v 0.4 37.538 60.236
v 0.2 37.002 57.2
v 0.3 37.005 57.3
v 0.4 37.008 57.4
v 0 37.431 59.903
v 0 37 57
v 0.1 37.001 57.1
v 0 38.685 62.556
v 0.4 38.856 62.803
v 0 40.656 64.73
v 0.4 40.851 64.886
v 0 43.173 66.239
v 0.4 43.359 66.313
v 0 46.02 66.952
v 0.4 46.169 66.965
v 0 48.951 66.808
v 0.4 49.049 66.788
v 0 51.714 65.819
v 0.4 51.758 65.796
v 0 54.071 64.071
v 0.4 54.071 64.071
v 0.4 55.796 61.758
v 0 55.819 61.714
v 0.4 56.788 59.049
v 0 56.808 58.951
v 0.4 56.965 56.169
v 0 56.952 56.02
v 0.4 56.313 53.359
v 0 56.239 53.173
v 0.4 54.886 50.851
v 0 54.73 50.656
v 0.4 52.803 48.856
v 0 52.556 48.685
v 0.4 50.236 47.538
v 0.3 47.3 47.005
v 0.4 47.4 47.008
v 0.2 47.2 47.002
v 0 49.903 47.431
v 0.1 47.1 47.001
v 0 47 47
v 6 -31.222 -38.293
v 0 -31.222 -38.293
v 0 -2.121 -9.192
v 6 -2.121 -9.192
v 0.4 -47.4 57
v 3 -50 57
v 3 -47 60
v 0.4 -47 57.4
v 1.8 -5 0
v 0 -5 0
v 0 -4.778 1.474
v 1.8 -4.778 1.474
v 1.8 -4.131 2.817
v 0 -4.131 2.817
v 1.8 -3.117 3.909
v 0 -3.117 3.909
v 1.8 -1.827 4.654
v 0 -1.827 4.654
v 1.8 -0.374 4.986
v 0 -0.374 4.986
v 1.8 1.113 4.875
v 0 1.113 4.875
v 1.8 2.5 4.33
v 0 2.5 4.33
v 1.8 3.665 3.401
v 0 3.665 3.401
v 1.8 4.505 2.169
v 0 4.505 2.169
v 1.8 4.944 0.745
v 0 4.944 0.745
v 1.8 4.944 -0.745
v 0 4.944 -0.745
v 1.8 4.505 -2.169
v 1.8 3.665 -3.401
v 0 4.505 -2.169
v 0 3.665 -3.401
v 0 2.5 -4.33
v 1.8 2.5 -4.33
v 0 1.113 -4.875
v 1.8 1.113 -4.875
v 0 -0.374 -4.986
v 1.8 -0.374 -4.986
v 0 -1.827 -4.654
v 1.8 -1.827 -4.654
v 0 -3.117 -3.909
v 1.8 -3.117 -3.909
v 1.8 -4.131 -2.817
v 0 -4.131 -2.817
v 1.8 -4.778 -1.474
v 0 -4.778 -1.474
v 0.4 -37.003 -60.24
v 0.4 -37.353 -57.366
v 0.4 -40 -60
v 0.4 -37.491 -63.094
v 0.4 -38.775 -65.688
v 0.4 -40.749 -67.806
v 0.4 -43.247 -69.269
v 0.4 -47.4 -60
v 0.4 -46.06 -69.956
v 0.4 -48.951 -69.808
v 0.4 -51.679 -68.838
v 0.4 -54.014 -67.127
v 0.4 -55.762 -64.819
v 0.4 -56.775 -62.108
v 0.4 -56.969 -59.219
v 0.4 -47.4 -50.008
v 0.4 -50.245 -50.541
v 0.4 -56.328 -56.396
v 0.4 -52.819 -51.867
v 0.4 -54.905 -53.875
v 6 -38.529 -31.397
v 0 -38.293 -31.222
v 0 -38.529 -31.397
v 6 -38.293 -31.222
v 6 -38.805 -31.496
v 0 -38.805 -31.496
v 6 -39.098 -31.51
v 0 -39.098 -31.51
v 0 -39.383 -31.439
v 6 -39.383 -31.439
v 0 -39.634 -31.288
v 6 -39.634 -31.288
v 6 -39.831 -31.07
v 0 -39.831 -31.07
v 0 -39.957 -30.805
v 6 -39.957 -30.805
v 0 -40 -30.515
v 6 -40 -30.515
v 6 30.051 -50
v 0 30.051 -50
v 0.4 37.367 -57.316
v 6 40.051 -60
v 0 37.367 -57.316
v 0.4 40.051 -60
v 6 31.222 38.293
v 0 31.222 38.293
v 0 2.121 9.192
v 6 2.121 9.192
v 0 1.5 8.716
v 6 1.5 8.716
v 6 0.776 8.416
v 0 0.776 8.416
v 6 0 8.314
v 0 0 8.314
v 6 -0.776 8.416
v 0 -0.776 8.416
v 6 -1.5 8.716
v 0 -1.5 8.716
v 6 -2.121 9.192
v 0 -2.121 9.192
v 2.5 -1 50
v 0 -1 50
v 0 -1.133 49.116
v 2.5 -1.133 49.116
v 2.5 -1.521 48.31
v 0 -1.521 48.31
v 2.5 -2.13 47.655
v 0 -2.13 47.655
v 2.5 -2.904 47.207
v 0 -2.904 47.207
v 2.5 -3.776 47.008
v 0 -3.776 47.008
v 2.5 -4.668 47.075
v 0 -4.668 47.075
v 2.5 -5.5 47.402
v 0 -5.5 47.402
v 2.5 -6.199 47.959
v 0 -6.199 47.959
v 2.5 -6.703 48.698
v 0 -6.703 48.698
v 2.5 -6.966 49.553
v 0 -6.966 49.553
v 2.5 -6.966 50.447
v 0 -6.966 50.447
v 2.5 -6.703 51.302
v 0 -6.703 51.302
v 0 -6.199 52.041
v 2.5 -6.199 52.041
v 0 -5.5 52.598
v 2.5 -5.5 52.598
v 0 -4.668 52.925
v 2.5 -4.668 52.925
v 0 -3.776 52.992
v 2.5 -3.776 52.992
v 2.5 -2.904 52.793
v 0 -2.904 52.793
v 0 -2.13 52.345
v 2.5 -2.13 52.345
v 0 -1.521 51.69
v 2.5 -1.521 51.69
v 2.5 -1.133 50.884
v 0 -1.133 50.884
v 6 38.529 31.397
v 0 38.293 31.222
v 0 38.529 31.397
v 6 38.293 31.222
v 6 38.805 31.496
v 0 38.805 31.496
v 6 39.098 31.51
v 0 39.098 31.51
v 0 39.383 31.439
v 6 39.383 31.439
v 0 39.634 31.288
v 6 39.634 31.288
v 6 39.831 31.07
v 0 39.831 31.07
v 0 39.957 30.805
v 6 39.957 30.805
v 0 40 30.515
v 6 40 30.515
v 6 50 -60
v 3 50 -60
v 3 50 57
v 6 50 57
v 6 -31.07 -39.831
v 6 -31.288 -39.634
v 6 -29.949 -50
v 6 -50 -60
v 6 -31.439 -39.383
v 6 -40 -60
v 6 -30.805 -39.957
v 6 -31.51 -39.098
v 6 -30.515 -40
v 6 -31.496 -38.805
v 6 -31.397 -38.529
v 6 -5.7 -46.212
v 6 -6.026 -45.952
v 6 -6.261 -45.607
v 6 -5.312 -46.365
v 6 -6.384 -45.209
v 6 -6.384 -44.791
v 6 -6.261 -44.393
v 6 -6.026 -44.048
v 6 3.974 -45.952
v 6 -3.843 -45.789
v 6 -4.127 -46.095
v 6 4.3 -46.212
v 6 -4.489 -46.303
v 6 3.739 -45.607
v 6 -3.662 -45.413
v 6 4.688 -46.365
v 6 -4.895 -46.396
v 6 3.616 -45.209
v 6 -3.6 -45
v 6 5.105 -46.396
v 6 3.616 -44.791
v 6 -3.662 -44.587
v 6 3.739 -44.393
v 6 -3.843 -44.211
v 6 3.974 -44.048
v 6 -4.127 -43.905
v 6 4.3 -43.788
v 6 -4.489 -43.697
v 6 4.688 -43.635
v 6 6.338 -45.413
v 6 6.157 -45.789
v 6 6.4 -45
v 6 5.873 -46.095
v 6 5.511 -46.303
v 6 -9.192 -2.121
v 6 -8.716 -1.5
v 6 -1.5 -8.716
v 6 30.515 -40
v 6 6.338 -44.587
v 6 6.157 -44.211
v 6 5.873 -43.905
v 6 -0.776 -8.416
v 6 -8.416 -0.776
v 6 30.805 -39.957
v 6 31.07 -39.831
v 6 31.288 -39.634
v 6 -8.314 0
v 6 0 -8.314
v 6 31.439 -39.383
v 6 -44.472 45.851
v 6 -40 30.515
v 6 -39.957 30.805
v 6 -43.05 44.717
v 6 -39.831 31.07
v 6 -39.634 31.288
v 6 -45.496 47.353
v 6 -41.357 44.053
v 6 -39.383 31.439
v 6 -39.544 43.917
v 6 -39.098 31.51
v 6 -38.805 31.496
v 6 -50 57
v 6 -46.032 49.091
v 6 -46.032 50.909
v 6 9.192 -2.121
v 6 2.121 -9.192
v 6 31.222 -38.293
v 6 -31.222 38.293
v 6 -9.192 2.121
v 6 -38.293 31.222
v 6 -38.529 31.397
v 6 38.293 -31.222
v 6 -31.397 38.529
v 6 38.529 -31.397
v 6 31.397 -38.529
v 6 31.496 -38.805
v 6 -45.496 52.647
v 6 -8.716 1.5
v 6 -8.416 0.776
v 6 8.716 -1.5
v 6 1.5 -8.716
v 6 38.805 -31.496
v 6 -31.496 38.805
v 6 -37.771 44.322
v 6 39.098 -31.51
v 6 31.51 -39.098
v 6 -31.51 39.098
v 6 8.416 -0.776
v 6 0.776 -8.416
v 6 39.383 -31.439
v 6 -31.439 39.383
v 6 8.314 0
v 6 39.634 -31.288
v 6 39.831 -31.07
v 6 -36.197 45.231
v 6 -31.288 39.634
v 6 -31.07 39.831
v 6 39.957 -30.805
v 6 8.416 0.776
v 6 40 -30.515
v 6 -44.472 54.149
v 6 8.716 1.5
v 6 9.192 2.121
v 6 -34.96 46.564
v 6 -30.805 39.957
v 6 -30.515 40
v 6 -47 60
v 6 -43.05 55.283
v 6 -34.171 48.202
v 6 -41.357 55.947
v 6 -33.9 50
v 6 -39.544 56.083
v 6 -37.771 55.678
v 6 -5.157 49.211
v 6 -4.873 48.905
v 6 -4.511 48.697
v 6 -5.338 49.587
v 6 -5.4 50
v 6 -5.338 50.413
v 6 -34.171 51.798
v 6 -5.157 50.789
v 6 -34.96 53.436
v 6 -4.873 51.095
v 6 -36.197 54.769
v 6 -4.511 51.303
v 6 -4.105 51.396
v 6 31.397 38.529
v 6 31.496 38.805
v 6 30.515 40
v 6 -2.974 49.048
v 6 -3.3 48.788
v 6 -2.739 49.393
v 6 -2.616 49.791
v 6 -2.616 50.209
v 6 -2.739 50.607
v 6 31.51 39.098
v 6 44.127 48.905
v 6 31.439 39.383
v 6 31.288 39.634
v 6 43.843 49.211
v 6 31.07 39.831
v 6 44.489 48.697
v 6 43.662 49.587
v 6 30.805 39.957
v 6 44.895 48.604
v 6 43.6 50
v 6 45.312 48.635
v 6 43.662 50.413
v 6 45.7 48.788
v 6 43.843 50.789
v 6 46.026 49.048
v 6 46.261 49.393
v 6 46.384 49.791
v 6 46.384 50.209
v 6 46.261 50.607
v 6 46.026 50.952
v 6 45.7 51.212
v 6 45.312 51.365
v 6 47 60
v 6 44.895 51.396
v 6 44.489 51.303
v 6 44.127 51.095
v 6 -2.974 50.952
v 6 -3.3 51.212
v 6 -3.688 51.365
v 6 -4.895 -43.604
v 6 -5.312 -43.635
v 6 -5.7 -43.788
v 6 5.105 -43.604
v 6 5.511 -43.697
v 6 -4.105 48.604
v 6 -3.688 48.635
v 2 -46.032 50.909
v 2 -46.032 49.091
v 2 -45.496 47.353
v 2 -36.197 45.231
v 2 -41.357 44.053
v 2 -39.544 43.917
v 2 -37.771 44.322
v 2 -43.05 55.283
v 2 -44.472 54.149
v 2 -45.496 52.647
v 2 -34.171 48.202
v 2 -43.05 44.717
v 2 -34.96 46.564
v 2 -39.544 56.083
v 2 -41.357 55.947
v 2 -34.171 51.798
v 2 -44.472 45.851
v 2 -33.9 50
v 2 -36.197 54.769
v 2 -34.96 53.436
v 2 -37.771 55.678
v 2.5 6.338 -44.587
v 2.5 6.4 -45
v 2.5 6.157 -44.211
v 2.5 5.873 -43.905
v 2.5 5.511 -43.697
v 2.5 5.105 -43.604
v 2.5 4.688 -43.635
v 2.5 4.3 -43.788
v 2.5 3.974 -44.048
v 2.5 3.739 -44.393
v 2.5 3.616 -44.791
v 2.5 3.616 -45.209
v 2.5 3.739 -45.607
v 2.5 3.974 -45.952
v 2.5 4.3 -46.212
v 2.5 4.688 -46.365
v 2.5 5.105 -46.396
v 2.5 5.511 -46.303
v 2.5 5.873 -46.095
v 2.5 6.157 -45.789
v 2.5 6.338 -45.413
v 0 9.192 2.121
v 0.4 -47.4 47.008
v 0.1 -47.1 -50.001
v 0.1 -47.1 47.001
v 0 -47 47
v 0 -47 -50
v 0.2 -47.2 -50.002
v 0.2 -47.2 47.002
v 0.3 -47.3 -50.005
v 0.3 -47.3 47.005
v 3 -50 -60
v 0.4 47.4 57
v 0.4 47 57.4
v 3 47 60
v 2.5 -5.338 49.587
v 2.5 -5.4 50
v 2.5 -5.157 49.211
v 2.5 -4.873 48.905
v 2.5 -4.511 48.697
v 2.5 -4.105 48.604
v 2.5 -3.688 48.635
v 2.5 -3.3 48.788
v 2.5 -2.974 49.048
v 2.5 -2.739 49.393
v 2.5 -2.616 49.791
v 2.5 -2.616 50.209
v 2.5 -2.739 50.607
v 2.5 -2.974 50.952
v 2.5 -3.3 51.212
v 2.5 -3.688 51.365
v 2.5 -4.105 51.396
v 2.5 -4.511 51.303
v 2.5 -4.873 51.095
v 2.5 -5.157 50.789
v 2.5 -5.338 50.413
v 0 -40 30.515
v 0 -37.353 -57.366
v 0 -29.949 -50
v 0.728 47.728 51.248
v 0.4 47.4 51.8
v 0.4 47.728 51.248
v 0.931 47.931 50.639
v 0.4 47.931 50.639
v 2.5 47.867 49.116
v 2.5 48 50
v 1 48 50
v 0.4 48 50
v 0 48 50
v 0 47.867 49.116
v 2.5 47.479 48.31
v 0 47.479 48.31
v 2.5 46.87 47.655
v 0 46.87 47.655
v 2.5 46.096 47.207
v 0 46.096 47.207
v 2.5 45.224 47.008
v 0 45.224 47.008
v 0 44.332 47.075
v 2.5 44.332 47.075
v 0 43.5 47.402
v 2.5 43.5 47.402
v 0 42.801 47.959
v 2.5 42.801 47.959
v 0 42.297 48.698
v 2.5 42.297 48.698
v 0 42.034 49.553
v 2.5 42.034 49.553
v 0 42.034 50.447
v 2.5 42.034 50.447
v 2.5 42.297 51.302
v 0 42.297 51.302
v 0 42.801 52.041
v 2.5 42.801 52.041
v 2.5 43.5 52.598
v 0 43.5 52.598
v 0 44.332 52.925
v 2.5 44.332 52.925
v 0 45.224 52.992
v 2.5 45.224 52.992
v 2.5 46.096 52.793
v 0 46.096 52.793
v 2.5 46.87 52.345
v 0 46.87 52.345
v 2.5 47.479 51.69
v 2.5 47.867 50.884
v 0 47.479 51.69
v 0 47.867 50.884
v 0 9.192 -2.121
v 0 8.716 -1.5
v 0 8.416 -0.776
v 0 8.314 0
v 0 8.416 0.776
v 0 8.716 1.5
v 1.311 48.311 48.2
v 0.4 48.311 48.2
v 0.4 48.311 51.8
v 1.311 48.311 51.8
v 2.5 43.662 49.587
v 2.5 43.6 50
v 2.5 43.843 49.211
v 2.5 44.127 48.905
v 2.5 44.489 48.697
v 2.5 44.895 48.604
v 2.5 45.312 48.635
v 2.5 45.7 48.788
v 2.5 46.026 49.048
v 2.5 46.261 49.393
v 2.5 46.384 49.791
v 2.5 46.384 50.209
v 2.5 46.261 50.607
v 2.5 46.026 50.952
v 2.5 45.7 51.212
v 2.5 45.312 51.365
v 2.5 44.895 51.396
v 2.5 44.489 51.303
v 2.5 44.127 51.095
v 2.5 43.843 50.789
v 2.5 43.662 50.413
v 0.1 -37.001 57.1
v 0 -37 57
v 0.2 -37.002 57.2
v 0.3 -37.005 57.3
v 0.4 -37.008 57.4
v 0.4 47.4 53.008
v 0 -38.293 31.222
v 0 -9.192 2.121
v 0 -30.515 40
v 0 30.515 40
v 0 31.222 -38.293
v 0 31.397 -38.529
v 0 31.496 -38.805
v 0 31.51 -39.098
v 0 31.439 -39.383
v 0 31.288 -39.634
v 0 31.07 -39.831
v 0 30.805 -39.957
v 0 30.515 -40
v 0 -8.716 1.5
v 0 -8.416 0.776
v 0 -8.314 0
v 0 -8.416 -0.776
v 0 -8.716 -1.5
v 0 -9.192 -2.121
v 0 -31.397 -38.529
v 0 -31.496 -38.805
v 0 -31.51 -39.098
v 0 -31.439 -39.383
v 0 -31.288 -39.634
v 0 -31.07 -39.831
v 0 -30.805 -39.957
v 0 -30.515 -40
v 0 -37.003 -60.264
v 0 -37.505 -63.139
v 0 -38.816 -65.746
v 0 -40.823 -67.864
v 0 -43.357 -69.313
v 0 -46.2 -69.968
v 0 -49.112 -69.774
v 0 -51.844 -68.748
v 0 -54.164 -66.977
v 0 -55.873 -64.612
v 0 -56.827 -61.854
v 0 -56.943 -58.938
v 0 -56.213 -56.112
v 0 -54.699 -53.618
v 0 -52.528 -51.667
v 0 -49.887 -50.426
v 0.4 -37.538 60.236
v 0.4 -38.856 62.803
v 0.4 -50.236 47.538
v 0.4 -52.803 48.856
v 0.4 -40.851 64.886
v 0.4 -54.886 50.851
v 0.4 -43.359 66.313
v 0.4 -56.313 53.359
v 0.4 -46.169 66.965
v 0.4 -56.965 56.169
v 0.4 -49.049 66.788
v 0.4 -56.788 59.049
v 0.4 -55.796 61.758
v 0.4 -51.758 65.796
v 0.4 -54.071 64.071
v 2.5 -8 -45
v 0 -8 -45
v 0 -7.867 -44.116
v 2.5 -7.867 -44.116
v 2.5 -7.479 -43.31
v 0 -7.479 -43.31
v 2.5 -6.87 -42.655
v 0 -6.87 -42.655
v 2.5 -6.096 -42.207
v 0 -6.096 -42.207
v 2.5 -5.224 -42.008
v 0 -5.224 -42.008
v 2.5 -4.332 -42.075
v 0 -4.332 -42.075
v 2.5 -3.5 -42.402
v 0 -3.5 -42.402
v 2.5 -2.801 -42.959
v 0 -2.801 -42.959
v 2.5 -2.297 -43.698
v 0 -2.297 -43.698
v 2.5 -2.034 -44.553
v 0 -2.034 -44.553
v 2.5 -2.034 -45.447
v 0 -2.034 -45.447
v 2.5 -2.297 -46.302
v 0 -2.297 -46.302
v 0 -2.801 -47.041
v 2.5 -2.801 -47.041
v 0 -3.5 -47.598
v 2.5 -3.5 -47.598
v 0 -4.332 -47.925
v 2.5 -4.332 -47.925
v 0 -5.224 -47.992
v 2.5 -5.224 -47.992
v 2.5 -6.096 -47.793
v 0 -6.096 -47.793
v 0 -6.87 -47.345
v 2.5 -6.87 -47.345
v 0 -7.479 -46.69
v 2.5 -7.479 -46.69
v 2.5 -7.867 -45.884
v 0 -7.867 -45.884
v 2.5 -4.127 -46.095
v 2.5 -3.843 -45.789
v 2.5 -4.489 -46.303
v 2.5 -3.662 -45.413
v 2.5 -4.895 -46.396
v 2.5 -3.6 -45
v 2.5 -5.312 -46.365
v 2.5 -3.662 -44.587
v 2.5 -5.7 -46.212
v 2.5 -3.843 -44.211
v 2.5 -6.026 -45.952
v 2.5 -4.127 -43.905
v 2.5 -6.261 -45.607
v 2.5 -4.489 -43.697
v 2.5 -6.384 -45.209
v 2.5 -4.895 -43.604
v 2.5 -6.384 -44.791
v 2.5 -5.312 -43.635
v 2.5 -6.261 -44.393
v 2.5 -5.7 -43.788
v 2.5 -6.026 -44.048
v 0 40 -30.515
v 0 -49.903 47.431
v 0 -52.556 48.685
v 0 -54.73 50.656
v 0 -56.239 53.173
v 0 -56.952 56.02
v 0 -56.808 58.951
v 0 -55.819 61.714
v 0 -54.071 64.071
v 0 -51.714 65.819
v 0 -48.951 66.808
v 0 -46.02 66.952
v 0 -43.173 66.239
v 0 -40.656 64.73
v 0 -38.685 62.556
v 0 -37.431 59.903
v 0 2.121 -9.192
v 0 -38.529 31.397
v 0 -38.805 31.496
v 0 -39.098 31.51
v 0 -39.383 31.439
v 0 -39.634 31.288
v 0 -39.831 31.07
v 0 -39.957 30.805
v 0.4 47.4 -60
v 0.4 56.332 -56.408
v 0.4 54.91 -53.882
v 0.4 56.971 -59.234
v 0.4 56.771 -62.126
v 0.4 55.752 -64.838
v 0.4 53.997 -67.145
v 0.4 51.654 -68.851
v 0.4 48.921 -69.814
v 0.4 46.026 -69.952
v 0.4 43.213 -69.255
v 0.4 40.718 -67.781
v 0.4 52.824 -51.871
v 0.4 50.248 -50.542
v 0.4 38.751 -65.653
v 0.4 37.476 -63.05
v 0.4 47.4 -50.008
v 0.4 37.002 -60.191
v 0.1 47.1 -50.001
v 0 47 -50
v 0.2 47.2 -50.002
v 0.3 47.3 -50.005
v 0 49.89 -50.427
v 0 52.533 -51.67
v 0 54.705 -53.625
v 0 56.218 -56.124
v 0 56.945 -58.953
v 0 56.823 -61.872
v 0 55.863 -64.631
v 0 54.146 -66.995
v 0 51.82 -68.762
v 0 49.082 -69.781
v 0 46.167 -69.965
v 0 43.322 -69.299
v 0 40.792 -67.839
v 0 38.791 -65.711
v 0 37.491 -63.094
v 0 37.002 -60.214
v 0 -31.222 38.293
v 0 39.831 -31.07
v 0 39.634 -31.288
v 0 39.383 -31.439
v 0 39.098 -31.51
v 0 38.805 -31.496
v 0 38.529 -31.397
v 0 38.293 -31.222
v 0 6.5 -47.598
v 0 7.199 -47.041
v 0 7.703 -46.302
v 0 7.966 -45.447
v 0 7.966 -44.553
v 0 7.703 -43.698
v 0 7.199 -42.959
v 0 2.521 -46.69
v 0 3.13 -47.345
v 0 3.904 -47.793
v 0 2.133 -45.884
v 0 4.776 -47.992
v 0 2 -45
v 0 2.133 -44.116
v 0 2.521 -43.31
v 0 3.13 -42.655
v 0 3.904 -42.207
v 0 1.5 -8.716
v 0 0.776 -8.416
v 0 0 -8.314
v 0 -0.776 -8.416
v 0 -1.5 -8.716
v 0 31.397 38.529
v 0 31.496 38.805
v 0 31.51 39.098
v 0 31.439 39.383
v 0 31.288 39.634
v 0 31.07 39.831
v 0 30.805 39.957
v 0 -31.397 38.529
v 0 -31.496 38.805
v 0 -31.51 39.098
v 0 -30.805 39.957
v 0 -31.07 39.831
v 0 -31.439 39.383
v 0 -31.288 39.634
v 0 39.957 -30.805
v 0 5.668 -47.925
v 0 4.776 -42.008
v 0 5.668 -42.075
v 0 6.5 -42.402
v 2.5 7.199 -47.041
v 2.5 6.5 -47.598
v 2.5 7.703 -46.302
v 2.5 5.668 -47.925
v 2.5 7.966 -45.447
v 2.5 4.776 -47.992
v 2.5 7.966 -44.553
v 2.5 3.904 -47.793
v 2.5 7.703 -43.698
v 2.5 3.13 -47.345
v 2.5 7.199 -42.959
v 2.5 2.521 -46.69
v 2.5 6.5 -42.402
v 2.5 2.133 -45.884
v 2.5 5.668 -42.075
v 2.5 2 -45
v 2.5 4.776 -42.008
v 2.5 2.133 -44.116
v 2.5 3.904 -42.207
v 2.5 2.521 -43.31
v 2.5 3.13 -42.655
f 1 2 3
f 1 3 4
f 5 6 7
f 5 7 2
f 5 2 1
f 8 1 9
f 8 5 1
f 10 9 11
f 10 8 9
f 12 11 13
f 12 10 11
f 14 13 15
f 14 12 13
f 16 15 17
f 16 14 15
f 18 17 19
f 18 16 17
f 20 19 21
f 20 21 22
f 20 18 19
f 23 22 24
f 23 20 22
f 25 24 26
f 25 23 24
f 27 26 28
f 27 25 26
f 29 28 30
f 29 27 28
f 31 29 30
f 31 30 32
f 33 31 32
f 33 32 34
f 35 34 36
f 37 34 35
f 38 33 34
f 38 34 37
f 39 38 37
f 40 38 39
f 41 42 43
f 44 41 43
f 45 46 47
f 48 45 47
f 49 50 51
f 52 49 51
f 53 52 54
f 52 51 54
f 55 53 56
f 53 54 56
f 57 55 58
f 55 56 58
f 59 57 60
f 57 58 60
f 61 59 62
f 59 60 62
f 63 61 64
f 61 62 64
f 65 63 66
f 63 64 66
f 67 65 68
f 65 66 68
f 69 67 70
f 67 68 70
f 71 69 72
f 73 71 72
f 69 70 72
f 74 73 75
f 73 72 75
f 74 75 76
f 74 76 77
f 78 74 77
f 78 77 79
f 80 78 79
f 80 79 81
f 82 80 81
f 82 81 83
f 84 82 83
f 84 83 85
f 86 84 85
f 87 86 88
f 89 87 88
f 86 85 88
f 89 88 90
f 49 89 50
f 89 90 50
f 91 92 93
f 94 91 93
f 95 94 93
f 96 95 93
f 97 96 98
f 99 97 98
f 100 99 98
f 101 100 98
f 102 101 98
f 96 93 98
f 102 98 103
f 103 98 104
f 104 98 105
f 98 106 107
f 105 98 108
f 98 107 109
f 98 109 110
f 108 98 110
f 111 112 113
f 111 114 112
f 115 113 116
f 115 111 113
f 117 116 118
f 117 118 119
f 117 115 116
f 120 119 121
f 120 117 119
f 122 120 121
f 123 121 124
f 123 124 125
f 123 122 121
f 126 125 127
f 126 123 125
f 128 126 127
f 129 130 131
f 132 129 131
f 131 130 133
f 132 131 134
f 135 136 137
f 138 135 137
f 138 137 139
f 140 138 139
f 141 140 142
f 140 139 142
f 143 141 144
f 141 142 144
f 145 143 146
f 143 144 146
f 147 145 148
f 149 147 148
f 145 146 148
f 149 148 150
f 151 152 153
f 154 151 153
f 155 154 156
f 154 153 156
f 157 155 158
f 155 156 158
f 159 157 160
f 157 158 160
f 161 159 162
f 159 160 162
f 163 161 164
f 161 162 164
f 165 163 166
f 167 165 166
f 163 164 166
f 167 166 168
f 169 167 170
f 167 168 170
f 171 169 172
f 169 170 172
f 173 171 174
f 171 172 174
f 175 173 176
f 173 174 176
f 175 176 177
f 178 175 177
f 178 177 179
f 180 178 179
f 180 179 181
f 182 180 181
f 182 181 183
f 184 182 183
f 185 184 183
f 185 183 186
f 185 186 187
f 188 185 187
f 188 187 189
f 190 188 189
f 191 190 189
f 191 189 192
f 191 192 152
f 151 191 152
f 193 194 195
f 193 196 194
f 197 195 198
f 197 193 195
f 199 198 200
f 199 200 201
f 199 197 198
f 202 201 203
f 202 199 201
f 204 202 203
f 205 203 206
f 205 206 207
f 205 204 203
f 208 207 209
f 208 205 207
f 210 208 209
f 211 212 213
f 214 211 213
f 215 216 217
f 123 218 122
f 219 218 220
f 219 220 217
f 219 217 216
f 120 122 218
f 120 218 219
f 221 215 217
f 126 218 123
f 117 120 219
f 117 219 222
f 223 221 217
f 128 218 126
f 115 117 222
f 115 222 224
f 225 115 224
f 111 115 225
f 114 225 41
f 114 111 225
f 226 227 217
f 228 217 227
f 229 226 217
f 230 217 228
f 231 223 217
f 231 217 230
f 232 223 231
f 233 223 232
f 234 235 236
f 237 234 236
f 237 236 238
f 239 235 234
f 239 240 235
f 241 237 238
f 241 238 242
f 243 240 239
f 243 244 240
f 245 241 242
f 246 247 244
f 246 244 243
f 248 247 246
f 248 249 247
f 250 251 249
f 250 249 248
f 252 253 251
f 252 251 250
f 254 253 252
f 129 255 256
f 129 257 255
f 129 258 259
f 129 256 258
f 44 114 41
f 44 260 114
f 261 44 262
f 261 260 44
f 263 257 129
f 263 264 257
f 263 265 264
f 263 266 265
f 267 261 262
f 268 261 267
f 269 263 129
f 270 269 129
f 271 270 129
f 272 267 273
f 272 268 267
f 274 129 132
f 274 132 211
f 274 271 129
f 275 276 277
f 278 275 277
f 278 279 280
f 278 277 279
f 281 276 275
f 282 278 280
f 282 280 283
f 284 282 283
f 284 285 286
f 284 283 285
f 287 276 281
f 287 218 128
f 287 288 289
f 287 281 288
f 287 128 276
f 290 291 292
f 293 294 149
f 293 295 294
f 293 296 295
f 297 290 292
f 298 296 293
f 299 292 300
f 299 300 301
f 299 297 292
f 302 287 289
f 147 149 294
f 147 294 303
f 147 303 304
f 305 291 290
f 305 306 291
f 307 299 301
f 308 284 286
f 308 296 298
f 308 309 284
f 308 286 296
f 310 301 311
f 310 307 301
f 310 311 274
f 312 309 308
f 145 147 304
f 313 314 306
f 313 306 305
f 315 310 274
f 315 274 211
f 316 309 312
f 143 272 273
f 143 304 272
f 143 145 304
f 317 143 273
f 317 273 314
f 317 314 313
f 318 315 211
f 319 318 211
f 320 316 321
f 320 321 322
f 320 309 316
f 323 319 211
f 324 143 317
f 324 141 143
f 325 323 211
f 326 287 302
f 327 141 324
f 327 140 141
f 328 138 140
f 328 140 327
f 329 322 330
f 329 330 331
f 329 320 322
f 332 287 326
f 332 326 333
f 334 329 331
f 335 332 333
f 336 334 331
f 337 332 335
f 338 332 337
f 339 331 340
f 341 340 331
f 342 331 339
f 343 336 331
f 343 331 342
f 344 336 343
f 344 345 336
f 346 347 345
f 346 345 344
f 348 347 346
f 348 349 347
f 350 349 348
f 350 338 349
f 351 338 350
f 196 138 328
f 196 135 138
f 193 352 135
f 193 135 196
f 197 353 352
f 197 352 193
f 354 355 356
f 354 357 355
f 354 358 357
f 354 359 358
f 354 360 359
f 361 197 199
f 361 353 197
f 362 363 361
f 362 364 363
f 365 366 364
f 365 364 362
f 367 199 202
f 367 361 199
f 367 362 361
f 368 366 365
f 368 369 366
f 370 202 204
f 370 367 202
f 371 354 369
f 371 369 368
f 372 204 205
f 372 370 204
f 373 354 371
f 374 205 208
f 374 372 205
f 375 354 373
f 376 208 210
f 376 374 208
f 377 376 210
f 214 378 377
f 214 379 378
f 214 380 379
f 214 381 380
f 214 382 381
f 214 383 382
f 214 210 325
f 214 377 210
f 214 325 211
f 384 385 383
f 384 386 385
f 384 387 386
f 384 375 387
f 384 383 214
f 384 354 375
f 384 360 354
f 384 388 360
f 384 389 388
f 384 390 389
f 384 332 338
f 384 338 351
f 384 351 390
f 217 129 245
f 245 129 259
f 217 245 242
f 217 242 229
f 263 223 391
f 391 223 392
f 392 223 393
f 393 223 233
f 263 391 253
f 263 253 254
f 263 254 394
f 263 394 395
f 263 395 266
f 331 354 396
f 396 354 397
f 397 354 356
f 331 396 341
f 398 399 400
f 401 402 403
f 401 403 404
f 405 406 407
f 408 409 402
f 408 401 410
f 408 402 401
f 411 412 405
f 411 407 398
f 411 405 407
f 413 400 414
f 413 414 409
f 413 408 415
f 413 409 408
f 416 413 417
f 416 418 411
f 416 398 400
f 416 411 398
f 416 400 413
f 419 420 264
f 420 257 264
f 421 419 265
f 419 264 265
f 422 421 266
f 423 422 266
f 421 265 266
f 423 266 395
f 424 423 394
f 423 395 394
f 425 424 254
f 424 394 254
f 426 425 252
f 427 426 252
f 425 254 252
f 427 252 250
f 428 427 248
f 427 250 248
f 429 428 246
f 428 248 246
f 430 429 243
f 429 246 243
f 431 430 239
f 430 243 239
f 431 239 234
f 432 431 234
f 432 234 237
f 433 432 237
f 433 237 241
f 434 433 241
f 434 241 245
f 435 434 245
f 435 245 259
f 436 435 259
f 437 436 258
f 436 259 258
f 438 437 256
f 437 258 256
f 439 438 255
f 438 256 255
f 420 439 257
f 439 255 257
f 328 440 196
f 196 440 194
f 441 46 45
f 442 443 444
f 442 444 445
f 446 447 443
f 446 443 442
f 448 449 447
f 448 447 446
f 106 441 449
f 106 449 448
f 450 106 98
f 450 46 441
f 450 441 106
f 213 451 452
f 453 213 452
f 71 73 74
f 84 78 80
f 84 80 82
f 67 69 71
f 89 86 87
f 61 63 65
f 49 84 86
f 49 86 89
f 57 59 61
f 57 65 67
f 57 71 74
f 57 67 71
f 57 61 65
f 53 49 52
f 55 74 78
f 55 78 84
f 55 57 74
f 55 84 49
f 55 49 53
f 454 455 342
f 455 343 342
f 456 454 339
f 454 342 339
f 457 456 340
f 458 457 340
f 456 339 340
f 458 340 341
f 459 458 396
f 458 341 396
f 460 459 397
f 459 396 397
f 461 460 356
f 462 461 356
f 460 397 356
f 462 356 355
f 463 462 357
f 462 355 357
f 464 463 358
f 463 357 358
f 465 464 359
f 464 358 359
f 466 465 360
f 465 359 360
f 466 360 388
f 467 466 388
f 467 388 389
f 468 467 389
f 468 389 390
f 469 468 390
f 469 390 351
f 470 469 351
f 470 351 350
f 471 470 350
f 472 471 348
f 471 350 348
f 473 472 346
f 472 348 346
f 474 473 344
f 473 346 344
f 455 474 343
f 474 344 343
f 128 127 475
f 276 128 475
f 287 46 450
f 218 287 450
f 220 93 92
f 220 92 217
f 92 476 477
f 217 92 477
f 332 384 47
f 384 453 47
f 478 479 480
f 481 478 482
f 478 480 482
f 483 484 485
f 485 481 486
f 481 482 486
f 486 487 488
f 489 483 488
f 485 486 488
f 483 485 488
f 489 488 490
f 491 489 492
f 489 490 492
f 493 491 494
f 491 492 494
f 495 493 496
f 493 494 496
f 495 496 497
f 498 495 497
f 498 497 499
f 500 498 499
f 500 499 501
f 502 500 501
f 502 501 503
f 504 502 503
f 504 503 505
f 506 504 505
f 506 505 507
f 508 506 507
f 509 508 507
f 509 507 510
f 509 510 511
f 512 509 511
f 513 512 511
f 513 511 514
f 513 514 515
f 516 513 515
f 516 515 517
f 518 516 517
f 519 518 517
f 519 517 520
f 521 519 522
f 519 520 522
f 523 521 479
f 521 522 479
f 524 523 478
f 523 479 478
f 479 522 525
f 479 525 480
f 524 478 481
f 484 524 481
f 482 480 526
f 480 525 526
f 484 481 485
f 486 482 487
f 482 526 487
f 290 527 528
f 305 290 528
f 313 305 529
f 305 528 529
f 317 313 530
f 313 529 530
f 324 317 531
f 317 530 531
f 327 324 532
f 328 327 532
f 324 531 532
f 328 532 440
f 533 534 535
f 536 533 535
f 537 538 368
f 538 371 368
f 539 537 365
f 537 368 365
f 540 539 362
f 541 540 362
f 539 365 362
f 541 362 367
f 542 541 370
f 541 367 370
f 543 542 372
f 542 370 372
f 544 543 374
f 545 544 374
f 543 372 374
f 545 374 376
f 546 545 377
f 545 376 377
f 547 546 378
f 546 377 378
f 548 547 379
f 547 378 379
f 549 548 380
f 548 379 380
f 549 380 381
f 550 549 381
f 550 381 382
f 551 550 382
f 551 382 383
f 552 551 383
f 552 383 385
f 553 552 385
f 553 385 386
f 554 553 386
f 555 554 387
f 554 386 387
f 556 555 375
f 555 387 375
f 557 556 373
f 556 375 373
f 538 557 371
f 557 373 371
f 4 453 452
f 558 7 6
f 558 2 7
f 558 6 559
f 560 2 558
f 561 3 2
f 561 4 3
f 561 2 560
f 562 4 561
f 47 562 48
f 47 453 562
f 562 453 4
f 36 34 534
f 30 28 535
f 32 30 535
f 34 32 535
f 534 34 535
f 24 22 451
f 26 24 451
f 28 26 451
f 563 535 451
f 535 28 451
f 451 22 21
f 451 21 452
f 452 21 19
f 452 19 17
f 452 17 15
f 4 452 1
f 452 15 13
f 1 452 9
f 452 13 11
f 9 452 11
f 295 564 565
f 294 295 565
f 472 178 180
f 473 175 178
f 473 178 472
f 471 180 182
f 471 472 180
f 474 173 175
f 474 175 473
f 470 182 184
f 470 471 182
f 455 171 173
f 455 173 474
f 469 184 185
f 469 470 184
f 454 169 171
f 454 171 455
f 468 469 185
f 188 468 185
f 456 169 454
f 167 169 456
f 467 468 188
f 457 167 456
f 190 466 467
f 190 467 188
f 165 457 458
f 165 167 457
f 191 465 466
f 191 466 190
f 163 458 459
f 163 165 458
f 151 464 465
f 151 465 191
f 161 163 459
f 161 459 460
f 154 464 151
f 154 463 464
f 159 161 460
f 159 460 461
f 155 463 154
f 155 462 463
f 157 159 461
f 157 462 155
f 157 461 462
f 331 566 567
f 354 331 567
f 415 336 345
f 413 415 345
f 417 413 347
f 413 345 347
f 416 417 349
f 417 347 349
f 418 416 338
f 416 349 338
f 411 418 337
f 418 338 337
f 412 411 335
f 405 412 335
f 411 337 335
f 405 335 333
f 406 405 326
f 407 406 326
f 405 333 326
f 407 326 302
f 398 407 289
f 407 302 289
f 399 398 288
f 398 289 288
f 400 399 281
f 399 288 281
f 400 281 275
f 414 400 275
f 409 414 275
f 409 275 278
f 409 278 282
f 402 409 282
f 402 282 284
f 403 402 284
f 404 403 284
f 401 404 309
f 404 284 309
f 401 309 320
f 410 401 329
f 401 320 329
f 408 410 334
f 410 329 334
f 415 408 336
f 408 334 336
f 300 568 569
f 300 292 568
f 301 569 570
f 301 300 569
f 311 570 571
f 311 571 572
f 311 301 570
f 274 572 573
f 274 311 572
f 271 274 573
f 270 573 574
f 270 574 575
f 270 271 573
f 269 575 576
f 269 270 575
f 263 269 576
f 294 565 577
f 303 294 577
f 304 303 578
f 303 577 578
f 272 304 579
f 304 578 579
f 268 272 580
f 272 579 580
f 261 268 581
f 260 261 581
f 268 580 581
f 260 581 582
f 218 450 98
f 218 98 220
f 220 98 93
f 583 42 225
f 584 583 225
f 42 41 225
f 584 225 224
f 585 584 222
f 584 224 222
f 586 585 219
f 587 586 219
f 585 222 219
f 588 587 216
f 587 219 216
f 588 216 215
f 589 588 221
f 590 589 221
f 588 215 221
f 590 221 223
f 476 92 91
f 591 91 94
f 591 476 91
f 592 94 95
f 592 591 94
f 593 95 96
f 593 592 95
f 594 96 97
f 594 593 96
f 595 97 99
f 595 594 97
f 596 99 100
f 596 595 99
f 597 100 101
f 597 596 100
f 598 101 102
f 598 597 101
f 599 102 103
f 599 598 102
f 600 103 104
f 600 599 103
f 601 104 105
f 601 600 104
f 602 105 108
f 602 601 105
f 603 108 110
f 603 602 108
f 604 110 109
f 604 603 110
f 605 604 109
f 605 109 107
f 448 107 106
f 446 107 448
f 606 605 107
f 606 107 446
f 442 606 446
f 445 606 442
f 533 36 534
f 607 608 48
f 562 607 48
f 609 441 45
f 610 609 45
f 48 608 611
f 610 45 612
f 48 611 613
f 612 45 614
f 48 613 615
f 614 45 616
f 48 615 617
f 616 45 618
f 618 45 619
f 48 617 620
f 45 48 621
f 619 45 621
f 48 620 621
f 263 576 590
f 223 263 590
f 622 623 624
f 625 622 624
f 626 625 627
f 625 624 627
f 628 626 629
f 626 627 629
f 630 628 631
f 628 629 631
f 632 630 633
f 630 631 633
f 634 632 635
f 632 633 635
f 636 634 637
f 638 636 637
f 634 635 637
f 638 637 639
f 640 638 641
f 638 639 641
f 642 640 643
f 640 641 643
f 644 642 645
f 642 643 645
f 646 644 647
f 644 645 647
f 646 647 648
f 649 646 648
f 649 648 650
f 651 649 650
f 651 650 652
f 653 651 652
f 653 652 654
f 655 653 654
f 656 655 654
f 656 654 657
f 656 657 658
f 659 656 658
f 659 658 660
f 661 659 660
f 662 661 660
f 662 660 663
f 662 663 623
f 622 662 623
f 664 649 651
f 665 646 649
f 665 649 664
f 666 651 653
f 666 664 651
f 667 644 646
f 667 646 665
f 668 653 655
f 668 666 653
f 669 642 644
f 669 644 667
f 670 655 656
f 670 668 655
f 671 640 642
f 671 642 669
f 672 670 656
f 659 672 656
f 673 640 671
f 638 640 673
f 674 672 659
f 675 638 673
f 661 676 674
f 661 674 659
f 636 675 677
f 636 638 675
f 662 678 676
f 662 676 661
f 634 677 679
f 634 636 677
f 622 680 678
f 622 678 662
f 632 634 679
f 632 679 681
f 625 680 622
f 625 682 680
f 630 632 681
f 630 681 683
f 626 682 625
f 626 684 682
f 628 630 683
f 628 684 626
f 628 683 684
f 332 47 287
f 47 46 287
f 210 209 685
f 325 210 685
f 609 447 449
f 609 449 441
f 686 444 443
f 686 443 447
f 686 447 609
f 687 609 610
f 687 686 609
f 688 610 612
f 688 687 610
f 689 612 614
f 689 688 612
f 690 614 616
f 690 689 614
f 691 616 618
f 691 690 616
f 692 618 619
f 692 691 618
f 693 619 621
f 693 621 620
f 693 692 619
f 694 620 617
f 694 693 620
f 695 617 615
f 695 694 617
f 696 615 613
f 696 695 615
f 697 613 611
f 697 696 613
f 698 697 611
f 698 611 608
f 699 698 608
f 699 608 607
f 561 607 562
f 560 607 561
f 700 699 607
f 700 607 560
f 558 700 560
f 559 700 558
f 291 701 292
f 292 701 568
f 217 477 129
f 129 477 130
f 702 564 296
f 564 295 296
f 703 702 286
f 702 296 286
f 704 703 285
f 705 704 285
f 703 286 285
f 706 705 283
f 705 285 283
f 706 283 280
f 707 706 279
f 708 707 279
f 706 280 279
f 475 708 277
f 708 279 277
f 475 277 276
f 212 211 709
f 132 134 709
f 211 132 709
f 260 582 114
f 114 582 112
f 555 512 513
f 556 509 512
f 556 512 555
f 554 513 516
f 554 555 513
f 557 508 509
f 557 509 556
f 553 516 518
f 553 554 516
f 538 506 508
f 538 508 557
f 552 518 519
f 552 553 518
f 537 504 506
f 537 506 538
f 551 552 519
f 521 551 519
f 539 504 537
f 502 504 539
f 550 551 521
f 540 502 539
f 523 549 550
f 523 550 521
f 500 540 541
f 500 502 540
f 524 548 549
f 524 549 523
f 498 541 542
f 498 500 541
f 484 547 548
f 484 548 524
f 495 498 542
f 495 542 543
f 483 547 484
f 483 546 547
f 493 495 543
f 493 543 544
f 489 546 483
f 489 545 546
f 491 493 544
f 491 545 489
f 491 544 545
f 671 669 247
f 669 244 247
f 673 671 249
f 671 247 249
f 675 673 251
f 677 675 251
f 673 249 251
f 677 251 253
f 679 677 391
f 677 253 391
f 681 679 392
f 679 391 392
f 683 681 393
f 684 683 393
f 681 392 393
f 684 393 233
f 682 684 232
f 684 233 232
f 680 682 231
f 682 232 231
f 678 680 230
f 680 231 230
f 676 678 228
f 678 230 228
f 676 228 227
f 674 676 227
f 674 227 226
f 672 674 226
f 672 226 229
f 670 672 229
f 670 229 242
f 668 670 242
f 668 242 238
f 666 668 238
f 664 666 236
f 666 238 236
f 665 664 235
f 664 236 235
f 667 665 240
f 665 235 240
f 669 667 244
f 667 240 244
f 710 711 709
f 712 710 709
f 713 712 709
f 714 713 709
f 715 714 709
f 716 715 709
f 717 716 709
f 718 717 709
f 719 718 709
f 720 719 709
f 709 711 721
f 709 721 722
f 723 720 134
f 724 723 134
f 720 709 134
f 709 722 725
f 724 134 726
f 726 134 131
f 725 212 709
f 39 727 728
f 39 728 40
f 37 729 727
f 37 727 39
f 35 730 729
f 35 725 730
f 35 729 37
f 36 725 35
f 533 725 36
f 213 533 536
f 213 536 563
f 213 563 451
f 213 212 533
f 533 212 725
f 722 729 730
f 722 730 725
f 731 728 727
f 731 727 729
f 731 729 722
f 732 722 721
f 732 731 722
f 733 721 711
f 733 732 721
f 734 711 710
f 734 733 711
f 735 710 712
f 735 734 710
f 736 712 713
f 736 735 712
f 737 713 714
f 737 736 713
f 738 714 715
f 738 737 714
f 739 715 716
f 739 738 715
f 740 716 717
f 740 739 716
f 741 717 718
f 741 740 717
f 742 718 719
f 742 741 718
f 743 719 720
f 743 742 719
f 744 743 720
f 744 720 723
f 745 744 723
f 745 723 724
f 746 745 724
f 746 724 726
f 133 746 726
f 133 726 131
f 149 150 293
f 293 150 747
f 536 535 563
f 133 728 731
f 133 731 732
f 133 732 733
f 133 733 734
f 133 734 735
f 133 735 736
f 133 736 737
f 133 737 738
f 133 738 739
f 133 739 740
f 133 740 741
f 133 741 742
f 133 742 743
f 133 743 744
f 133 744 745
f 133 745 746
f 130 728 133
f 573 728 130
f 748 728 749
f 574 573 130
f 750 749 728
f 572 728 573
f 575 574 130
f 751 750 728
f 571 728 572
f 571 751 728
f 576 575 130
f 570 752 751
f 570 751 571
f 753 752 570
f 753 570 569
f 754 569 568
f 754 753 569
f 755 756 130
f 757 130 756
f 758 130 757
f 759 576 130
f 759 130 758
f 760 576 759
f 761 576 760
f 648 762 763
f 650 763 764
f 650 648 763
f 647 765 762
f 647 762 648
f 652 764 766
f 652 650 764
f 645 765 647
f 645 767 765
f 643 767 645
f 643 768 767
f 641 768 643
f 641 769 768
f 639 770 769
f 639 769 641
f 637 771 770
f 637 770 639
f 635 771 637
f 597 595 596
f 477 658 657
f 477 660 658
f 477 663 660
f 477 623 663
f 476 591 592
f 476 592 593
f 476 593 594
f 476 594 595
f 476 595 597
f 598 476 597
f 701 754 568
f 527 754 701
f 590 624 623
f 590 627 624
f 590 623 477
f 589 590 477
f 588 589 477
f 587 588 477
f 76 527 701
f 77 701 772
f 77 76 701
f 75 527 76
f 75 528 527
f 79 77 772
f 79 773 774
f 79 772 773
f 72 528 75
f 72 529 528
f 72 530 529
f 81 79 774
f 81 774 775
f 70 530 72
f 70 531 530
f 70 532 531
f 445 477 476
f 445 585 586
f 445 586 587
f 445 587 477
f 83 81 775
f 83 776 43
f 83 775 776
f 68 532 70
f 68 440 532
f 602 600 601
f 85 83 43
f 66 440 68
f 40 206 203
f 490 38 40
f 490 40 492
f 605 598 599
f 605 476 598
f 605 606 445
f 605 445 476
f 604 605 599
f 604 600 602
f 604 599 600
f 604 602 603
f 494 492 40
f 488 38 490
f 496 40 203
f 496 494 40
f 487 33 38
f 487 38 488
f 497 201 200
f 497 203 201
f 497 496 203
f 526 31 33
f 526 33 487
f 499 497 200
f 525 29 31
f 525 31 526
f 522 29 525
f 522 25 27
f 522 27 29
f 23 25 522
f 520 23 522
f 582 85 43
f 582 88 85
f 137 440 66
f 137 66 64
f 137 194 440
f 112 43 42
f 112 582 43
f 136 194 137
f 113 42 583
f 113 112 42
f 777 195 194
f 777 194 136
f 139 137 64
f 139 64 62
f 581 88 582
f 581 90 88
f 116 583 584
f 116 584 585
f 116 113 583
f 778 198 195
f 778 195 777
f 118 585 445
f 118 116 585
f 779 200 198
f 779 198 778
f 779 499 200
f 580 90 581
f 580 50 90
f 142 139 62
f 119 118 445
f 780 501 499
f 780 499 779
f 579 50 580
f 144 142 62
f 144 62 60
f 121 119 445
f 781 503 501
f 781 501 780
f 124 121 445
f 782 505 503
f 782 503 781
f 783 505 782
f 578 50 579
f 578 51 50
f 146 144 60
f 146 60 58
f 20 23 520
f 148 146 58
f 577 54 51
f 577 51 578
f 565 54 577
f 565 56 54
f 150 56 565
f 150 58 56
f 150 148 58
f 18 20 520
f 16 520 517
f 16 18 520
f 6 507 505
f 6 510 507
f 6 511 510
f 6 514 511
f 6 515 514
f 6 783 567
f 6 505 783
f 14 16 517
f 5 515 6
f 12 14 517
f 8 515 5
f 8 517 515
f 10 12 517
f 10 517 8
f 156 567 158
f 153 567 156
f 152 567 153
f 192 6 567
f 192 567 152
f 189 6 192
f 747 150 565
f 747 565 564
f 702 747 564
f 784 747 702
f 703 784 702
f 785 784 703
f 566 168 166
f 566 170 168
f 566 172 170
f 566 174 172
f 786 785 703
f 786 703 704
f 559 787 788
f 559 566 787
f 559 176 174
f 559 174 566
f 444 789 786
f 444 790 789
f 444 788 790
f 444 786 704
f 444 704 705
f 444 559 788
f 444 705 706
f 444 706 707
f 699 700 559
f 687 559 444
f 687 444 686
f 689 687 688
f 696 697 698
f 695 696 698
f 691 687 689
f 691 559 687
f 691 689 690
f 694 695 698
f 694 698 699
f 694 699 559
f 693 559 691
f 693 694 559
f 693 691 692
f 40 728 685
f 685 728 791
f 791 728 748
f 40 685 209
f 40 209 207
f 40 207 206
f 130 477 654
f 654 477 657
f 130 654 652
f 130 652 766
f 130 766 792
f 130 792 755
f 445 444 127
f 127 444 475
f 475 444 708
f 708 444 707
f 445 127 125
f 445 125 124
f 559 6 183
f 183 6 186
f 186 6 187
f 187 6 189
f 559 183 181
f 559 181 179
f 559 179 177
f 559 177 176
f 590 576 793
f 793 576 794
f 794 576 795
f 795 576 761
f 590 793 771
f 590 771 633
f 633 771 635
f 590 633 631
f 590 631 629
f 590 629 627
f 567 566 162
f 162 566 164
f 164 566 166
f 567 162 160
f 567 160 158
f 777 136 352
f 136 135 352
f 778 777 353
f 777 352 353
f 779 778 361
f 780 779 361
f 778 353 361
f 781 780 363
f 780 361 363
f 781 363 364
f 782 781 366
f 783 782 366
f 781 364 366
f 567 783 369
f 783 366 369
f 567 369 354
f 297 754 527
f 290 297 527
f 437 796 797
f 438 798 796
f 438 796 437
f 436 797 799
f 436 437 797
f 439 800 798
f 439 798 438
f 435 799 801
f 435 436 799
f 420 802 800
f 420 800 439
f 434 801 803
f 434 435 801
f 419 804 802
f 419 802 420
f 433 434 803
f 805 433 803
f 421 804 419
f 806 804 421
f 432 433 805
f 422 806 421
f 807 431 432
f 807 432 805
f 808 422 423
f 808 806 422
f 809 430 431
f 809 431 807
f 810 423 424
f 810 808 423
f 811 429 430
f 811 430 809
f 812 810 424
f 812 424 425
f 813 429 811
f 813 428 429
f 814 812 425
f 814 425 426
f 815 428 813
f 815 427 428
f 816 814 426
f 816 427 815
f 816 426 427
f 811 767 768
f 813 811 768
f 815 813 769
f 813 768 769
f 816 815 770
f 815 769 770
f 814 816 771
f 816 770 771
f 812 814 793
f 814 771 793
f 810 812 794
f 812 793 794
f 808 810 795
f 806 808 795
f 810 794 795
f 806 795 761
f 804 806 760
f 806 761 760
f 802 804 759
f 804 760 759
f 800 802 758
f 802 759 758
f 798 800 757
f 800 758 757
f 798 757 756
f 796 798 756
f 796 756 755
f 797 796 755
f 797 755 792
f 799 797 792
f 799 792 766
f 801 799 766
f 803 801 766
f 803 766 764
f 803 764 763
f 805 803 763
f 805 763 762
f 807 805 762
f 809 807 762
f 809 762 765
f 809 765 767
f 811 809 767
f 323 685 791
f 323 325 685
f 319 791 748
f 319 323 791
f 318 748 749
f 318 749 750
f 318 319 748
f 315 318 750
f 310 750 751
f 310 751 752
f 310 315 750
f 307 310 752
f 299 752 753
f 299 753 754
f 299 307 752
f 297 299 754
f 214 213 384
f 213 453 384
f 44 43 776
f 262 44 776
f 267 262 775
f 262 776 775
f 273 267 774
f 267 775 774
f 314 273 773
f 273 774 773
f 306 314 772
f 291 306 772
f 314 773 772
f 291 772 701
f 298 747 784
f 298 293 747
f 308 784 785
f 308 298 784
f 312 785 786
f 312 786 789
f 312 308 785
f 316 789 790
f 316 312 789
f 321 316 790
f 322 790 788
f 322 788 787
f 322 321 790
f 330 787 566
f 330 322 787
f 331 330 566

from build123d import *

# Parameters (mm, degrees)
F1_DEPTH        = 6
F2_R            = 1
F3_R            = 5
F4_DEPTH        = 1.8
F6_D            = 2.8
F6_CBORE_D      = 6
F6_CBORE_DEPTH  = 2.5
F7_SIZE         = 3
F9_DEPTH        = 0.4
F10_D           = 2.8
F10_CBORE_D     = 6
F10_CBORE_DEPTH = 2.5
F11_R           = 6.1
F12_DEPTH       = 4
F14_DEPTH       = 1


with BuildPart() as f1:
    # F0 (on Right) → F1 (new body)
    with BuildSketch(Plane.YZ):
        Polygon((40.0512183458, -60), (50, -60), (50, 60), (-50, 60), (-50, -60), (-40, -60), (-29.9487816542, -50), (30.0512183458, -50), align=None)
        with BuildLine():
            Line((2.1213203436, -9.1923881554), (32.9289321881, -40))
            Line((32.9289321881, -40), (-32.9289321881, -40))
            Line((-32.9289321881, -40), (-2.1213203436, -9.1923881554))
            ThreePointArc((-2.1213203436, -9.1923881554), (0, -8.313708499), (2.1213203436, -9.1923881554))
        make_face(mode=Mode.SUBTRACT)
        with BuildLine():
            Line((-9.1923881554, -2.1213203436), (-40, -32.9289321881))
            Line((-40, -32.9289321881), (-40, 32.9289321881))
            Line((-40, 32.9289321881), (-9.1923881554, 2.1213203436))
            ThreePointArc((-9.1923881554, 2.1213203436), (-8.313708499, 0), (-9.1923881554, -2.1213203436))
        make_face(mode=Mode.SUBTRACT)
        with BuildLine():
            Line((40, 32.9289321881), (40, -32.9289321881))
            Line((40, -32.9289321881), (9.1923881554, -2.1213203436))
            ThreePointArc((9.1923881554, -2.1213203436), (8.313708499, 0), (9.1923881554, 2.1213203436))
            Line((9.1923881554, 2.1213203436), (40, 32.9289321881))
        make_face(mode=Mode.SUBTRACT)
        with BuildLine():
            Line((-32.9289321881, 40), (32.9289321881, 40))
            Line((32.9289321881, 40), (2.1213203436, 9.1923881554))
            ThreePointArc((2.1213203436, 9.1923881554), (0, 8.313708499), (-2.1213203436, 9.1923881554))
            Line((-2.1213203436, 9.1923881554), (-32.9289321881, 40))
        make_face(mode=Mode.SUBTRACT)
    extrude(amount=F1_DEPTH)

    # F2
    f2_edges = [f1.edges().sort_by_distance(p)[0] for p in [
        (3, -32.928932, 40),
        (3, 32.928932, 40),
        (3, -40, 32.928932),
        (3, -40, -32.928932),
        (3, -32.928932, -40),
        (3, 40, 32.928932),
        (3, 40, -32.928932),
        (3, 32.928932, -40),
    ]]
    fillet(f2_edges, radius=F2_R)

    # F3 (on face) → F4 (cut)
    with BuildSketch(Plane(origin=(0, 0, 0), x_dir=(0, -1, 0), z_dir=(-1, 0, 0))):
        Circle(F3_R)
    extrude(amount=-F4_DEPTH, mode=Mode.SUBTRACT)

    # F6 (through all)
    with Locations(Plane(origin=(0, 0, 0), x_dir=(0, -1, 0), z_dir=(-1, 0, 0))):
        with Locations((-5, -45), (5, -45)):
            CounterBoreHole(F6_D / 2, F6_CBORE_D / 2, F6_CBORE_DEPTH)

    # F7
    f7_edges = [f1.edges().sort_by_distance(p)[0] for p in [
        (3, -50, 60),
        (3, 50, 60),
        (0, -50, 0),
        (0, 50, 0),
        (0, 0, 60),
    ]]
    chamfer(f7_edges, length=F7_SIZE)

    # F8 (on face) → F9 (join)
    with BuildSketch(Plane(origin=(0, 0, 0), x_dir=(0, -1, 0), z_dir=(-1, 0, 0))):
        with BuildLine():
            Line((-47, 57), (-37, 57))
            ThreePointArc((-37, 57), (-54.0710678119, 64.0710678119), (-47, 47))
            Line((-47, 47), (-47, 57))
        make_face()
        with BuildLine():
            ThreePointArc((47, 47), (54.0710678119, 64.0710678119), (37, 57))
            Line((37, 57), (47, 57))
            Line((47, 57), (47, 47))
        make_face()
        with BuildLine():
            Line((-47, -60), (-47, -50))
            ThreePointArc((-47, -50), (-53.0480452096, -67.9637396456), (-37.3669885172, -57.3157701715))
            Line((-37.3669885172, -57.3157701715), (-40.0512183458, -60))
            Line((-40.0512183458, -60), (-47, -60))
        make_face()
        with BuildLine():
            ThreePointArc((37.3529996858, -57.3664880981), (53.0689735945, -67.9478021811), (47, -50))
            Line((47, -50), (47, -60))
            Line((47, -60), (40, -60))
            Line((40, -60), (37.3529996858, -57.3664880981))
        make_face()
    extrude(amount=-F9_DEPTH)

    # F10 (through all)
    with Locations(Plane(origin=(0, 0, 0), x_dir=(0, 1, 0), z_dir=(-1, 0, 0))):
        with Locations((-4, -50), (45, -50)):
            CounterBoreHole(F10_D / 2, F10_CBORE_D / 2, F10_CBORE_DEPTH)

    # F11 (on face) → F12 (cut)
    with BuildSketch(Plane.YZ.offset(6)):
        with Locations((-40, 50)):
            Circle(F11_R)
    extrude(amount=-F12_DEPTH, mode=Mode.SUBTRACT)

    # F13 (on face) → F14 (join)
    with BuildSketch(Plane.YZ.offset(0.4)):
        with BuildLine():
            Line((47.4, 48.2), (47.4, 47.0080032026))
            Line((47.4, 47.0080032026), (48.3105732452, 48.2))
            Line((48.3105732452, 48.2), (48.3105732452, 51.8))
            Line((48.3105732452, 51.8), (47.4, 53.0080032026))
            Line((47.4, 53.0080032026), (47.4, 51.8))
            ThreePointArc((47.4, 51.8), (47.8460498942, 50.9486832981), (48, 50))
            ThreePointArc((48, 50), (47.8460498942, 49.0513167019), (47.4, 48.2))
        make_face()
    extrude(amount=F14_DEPTH)


solid = f1.part
